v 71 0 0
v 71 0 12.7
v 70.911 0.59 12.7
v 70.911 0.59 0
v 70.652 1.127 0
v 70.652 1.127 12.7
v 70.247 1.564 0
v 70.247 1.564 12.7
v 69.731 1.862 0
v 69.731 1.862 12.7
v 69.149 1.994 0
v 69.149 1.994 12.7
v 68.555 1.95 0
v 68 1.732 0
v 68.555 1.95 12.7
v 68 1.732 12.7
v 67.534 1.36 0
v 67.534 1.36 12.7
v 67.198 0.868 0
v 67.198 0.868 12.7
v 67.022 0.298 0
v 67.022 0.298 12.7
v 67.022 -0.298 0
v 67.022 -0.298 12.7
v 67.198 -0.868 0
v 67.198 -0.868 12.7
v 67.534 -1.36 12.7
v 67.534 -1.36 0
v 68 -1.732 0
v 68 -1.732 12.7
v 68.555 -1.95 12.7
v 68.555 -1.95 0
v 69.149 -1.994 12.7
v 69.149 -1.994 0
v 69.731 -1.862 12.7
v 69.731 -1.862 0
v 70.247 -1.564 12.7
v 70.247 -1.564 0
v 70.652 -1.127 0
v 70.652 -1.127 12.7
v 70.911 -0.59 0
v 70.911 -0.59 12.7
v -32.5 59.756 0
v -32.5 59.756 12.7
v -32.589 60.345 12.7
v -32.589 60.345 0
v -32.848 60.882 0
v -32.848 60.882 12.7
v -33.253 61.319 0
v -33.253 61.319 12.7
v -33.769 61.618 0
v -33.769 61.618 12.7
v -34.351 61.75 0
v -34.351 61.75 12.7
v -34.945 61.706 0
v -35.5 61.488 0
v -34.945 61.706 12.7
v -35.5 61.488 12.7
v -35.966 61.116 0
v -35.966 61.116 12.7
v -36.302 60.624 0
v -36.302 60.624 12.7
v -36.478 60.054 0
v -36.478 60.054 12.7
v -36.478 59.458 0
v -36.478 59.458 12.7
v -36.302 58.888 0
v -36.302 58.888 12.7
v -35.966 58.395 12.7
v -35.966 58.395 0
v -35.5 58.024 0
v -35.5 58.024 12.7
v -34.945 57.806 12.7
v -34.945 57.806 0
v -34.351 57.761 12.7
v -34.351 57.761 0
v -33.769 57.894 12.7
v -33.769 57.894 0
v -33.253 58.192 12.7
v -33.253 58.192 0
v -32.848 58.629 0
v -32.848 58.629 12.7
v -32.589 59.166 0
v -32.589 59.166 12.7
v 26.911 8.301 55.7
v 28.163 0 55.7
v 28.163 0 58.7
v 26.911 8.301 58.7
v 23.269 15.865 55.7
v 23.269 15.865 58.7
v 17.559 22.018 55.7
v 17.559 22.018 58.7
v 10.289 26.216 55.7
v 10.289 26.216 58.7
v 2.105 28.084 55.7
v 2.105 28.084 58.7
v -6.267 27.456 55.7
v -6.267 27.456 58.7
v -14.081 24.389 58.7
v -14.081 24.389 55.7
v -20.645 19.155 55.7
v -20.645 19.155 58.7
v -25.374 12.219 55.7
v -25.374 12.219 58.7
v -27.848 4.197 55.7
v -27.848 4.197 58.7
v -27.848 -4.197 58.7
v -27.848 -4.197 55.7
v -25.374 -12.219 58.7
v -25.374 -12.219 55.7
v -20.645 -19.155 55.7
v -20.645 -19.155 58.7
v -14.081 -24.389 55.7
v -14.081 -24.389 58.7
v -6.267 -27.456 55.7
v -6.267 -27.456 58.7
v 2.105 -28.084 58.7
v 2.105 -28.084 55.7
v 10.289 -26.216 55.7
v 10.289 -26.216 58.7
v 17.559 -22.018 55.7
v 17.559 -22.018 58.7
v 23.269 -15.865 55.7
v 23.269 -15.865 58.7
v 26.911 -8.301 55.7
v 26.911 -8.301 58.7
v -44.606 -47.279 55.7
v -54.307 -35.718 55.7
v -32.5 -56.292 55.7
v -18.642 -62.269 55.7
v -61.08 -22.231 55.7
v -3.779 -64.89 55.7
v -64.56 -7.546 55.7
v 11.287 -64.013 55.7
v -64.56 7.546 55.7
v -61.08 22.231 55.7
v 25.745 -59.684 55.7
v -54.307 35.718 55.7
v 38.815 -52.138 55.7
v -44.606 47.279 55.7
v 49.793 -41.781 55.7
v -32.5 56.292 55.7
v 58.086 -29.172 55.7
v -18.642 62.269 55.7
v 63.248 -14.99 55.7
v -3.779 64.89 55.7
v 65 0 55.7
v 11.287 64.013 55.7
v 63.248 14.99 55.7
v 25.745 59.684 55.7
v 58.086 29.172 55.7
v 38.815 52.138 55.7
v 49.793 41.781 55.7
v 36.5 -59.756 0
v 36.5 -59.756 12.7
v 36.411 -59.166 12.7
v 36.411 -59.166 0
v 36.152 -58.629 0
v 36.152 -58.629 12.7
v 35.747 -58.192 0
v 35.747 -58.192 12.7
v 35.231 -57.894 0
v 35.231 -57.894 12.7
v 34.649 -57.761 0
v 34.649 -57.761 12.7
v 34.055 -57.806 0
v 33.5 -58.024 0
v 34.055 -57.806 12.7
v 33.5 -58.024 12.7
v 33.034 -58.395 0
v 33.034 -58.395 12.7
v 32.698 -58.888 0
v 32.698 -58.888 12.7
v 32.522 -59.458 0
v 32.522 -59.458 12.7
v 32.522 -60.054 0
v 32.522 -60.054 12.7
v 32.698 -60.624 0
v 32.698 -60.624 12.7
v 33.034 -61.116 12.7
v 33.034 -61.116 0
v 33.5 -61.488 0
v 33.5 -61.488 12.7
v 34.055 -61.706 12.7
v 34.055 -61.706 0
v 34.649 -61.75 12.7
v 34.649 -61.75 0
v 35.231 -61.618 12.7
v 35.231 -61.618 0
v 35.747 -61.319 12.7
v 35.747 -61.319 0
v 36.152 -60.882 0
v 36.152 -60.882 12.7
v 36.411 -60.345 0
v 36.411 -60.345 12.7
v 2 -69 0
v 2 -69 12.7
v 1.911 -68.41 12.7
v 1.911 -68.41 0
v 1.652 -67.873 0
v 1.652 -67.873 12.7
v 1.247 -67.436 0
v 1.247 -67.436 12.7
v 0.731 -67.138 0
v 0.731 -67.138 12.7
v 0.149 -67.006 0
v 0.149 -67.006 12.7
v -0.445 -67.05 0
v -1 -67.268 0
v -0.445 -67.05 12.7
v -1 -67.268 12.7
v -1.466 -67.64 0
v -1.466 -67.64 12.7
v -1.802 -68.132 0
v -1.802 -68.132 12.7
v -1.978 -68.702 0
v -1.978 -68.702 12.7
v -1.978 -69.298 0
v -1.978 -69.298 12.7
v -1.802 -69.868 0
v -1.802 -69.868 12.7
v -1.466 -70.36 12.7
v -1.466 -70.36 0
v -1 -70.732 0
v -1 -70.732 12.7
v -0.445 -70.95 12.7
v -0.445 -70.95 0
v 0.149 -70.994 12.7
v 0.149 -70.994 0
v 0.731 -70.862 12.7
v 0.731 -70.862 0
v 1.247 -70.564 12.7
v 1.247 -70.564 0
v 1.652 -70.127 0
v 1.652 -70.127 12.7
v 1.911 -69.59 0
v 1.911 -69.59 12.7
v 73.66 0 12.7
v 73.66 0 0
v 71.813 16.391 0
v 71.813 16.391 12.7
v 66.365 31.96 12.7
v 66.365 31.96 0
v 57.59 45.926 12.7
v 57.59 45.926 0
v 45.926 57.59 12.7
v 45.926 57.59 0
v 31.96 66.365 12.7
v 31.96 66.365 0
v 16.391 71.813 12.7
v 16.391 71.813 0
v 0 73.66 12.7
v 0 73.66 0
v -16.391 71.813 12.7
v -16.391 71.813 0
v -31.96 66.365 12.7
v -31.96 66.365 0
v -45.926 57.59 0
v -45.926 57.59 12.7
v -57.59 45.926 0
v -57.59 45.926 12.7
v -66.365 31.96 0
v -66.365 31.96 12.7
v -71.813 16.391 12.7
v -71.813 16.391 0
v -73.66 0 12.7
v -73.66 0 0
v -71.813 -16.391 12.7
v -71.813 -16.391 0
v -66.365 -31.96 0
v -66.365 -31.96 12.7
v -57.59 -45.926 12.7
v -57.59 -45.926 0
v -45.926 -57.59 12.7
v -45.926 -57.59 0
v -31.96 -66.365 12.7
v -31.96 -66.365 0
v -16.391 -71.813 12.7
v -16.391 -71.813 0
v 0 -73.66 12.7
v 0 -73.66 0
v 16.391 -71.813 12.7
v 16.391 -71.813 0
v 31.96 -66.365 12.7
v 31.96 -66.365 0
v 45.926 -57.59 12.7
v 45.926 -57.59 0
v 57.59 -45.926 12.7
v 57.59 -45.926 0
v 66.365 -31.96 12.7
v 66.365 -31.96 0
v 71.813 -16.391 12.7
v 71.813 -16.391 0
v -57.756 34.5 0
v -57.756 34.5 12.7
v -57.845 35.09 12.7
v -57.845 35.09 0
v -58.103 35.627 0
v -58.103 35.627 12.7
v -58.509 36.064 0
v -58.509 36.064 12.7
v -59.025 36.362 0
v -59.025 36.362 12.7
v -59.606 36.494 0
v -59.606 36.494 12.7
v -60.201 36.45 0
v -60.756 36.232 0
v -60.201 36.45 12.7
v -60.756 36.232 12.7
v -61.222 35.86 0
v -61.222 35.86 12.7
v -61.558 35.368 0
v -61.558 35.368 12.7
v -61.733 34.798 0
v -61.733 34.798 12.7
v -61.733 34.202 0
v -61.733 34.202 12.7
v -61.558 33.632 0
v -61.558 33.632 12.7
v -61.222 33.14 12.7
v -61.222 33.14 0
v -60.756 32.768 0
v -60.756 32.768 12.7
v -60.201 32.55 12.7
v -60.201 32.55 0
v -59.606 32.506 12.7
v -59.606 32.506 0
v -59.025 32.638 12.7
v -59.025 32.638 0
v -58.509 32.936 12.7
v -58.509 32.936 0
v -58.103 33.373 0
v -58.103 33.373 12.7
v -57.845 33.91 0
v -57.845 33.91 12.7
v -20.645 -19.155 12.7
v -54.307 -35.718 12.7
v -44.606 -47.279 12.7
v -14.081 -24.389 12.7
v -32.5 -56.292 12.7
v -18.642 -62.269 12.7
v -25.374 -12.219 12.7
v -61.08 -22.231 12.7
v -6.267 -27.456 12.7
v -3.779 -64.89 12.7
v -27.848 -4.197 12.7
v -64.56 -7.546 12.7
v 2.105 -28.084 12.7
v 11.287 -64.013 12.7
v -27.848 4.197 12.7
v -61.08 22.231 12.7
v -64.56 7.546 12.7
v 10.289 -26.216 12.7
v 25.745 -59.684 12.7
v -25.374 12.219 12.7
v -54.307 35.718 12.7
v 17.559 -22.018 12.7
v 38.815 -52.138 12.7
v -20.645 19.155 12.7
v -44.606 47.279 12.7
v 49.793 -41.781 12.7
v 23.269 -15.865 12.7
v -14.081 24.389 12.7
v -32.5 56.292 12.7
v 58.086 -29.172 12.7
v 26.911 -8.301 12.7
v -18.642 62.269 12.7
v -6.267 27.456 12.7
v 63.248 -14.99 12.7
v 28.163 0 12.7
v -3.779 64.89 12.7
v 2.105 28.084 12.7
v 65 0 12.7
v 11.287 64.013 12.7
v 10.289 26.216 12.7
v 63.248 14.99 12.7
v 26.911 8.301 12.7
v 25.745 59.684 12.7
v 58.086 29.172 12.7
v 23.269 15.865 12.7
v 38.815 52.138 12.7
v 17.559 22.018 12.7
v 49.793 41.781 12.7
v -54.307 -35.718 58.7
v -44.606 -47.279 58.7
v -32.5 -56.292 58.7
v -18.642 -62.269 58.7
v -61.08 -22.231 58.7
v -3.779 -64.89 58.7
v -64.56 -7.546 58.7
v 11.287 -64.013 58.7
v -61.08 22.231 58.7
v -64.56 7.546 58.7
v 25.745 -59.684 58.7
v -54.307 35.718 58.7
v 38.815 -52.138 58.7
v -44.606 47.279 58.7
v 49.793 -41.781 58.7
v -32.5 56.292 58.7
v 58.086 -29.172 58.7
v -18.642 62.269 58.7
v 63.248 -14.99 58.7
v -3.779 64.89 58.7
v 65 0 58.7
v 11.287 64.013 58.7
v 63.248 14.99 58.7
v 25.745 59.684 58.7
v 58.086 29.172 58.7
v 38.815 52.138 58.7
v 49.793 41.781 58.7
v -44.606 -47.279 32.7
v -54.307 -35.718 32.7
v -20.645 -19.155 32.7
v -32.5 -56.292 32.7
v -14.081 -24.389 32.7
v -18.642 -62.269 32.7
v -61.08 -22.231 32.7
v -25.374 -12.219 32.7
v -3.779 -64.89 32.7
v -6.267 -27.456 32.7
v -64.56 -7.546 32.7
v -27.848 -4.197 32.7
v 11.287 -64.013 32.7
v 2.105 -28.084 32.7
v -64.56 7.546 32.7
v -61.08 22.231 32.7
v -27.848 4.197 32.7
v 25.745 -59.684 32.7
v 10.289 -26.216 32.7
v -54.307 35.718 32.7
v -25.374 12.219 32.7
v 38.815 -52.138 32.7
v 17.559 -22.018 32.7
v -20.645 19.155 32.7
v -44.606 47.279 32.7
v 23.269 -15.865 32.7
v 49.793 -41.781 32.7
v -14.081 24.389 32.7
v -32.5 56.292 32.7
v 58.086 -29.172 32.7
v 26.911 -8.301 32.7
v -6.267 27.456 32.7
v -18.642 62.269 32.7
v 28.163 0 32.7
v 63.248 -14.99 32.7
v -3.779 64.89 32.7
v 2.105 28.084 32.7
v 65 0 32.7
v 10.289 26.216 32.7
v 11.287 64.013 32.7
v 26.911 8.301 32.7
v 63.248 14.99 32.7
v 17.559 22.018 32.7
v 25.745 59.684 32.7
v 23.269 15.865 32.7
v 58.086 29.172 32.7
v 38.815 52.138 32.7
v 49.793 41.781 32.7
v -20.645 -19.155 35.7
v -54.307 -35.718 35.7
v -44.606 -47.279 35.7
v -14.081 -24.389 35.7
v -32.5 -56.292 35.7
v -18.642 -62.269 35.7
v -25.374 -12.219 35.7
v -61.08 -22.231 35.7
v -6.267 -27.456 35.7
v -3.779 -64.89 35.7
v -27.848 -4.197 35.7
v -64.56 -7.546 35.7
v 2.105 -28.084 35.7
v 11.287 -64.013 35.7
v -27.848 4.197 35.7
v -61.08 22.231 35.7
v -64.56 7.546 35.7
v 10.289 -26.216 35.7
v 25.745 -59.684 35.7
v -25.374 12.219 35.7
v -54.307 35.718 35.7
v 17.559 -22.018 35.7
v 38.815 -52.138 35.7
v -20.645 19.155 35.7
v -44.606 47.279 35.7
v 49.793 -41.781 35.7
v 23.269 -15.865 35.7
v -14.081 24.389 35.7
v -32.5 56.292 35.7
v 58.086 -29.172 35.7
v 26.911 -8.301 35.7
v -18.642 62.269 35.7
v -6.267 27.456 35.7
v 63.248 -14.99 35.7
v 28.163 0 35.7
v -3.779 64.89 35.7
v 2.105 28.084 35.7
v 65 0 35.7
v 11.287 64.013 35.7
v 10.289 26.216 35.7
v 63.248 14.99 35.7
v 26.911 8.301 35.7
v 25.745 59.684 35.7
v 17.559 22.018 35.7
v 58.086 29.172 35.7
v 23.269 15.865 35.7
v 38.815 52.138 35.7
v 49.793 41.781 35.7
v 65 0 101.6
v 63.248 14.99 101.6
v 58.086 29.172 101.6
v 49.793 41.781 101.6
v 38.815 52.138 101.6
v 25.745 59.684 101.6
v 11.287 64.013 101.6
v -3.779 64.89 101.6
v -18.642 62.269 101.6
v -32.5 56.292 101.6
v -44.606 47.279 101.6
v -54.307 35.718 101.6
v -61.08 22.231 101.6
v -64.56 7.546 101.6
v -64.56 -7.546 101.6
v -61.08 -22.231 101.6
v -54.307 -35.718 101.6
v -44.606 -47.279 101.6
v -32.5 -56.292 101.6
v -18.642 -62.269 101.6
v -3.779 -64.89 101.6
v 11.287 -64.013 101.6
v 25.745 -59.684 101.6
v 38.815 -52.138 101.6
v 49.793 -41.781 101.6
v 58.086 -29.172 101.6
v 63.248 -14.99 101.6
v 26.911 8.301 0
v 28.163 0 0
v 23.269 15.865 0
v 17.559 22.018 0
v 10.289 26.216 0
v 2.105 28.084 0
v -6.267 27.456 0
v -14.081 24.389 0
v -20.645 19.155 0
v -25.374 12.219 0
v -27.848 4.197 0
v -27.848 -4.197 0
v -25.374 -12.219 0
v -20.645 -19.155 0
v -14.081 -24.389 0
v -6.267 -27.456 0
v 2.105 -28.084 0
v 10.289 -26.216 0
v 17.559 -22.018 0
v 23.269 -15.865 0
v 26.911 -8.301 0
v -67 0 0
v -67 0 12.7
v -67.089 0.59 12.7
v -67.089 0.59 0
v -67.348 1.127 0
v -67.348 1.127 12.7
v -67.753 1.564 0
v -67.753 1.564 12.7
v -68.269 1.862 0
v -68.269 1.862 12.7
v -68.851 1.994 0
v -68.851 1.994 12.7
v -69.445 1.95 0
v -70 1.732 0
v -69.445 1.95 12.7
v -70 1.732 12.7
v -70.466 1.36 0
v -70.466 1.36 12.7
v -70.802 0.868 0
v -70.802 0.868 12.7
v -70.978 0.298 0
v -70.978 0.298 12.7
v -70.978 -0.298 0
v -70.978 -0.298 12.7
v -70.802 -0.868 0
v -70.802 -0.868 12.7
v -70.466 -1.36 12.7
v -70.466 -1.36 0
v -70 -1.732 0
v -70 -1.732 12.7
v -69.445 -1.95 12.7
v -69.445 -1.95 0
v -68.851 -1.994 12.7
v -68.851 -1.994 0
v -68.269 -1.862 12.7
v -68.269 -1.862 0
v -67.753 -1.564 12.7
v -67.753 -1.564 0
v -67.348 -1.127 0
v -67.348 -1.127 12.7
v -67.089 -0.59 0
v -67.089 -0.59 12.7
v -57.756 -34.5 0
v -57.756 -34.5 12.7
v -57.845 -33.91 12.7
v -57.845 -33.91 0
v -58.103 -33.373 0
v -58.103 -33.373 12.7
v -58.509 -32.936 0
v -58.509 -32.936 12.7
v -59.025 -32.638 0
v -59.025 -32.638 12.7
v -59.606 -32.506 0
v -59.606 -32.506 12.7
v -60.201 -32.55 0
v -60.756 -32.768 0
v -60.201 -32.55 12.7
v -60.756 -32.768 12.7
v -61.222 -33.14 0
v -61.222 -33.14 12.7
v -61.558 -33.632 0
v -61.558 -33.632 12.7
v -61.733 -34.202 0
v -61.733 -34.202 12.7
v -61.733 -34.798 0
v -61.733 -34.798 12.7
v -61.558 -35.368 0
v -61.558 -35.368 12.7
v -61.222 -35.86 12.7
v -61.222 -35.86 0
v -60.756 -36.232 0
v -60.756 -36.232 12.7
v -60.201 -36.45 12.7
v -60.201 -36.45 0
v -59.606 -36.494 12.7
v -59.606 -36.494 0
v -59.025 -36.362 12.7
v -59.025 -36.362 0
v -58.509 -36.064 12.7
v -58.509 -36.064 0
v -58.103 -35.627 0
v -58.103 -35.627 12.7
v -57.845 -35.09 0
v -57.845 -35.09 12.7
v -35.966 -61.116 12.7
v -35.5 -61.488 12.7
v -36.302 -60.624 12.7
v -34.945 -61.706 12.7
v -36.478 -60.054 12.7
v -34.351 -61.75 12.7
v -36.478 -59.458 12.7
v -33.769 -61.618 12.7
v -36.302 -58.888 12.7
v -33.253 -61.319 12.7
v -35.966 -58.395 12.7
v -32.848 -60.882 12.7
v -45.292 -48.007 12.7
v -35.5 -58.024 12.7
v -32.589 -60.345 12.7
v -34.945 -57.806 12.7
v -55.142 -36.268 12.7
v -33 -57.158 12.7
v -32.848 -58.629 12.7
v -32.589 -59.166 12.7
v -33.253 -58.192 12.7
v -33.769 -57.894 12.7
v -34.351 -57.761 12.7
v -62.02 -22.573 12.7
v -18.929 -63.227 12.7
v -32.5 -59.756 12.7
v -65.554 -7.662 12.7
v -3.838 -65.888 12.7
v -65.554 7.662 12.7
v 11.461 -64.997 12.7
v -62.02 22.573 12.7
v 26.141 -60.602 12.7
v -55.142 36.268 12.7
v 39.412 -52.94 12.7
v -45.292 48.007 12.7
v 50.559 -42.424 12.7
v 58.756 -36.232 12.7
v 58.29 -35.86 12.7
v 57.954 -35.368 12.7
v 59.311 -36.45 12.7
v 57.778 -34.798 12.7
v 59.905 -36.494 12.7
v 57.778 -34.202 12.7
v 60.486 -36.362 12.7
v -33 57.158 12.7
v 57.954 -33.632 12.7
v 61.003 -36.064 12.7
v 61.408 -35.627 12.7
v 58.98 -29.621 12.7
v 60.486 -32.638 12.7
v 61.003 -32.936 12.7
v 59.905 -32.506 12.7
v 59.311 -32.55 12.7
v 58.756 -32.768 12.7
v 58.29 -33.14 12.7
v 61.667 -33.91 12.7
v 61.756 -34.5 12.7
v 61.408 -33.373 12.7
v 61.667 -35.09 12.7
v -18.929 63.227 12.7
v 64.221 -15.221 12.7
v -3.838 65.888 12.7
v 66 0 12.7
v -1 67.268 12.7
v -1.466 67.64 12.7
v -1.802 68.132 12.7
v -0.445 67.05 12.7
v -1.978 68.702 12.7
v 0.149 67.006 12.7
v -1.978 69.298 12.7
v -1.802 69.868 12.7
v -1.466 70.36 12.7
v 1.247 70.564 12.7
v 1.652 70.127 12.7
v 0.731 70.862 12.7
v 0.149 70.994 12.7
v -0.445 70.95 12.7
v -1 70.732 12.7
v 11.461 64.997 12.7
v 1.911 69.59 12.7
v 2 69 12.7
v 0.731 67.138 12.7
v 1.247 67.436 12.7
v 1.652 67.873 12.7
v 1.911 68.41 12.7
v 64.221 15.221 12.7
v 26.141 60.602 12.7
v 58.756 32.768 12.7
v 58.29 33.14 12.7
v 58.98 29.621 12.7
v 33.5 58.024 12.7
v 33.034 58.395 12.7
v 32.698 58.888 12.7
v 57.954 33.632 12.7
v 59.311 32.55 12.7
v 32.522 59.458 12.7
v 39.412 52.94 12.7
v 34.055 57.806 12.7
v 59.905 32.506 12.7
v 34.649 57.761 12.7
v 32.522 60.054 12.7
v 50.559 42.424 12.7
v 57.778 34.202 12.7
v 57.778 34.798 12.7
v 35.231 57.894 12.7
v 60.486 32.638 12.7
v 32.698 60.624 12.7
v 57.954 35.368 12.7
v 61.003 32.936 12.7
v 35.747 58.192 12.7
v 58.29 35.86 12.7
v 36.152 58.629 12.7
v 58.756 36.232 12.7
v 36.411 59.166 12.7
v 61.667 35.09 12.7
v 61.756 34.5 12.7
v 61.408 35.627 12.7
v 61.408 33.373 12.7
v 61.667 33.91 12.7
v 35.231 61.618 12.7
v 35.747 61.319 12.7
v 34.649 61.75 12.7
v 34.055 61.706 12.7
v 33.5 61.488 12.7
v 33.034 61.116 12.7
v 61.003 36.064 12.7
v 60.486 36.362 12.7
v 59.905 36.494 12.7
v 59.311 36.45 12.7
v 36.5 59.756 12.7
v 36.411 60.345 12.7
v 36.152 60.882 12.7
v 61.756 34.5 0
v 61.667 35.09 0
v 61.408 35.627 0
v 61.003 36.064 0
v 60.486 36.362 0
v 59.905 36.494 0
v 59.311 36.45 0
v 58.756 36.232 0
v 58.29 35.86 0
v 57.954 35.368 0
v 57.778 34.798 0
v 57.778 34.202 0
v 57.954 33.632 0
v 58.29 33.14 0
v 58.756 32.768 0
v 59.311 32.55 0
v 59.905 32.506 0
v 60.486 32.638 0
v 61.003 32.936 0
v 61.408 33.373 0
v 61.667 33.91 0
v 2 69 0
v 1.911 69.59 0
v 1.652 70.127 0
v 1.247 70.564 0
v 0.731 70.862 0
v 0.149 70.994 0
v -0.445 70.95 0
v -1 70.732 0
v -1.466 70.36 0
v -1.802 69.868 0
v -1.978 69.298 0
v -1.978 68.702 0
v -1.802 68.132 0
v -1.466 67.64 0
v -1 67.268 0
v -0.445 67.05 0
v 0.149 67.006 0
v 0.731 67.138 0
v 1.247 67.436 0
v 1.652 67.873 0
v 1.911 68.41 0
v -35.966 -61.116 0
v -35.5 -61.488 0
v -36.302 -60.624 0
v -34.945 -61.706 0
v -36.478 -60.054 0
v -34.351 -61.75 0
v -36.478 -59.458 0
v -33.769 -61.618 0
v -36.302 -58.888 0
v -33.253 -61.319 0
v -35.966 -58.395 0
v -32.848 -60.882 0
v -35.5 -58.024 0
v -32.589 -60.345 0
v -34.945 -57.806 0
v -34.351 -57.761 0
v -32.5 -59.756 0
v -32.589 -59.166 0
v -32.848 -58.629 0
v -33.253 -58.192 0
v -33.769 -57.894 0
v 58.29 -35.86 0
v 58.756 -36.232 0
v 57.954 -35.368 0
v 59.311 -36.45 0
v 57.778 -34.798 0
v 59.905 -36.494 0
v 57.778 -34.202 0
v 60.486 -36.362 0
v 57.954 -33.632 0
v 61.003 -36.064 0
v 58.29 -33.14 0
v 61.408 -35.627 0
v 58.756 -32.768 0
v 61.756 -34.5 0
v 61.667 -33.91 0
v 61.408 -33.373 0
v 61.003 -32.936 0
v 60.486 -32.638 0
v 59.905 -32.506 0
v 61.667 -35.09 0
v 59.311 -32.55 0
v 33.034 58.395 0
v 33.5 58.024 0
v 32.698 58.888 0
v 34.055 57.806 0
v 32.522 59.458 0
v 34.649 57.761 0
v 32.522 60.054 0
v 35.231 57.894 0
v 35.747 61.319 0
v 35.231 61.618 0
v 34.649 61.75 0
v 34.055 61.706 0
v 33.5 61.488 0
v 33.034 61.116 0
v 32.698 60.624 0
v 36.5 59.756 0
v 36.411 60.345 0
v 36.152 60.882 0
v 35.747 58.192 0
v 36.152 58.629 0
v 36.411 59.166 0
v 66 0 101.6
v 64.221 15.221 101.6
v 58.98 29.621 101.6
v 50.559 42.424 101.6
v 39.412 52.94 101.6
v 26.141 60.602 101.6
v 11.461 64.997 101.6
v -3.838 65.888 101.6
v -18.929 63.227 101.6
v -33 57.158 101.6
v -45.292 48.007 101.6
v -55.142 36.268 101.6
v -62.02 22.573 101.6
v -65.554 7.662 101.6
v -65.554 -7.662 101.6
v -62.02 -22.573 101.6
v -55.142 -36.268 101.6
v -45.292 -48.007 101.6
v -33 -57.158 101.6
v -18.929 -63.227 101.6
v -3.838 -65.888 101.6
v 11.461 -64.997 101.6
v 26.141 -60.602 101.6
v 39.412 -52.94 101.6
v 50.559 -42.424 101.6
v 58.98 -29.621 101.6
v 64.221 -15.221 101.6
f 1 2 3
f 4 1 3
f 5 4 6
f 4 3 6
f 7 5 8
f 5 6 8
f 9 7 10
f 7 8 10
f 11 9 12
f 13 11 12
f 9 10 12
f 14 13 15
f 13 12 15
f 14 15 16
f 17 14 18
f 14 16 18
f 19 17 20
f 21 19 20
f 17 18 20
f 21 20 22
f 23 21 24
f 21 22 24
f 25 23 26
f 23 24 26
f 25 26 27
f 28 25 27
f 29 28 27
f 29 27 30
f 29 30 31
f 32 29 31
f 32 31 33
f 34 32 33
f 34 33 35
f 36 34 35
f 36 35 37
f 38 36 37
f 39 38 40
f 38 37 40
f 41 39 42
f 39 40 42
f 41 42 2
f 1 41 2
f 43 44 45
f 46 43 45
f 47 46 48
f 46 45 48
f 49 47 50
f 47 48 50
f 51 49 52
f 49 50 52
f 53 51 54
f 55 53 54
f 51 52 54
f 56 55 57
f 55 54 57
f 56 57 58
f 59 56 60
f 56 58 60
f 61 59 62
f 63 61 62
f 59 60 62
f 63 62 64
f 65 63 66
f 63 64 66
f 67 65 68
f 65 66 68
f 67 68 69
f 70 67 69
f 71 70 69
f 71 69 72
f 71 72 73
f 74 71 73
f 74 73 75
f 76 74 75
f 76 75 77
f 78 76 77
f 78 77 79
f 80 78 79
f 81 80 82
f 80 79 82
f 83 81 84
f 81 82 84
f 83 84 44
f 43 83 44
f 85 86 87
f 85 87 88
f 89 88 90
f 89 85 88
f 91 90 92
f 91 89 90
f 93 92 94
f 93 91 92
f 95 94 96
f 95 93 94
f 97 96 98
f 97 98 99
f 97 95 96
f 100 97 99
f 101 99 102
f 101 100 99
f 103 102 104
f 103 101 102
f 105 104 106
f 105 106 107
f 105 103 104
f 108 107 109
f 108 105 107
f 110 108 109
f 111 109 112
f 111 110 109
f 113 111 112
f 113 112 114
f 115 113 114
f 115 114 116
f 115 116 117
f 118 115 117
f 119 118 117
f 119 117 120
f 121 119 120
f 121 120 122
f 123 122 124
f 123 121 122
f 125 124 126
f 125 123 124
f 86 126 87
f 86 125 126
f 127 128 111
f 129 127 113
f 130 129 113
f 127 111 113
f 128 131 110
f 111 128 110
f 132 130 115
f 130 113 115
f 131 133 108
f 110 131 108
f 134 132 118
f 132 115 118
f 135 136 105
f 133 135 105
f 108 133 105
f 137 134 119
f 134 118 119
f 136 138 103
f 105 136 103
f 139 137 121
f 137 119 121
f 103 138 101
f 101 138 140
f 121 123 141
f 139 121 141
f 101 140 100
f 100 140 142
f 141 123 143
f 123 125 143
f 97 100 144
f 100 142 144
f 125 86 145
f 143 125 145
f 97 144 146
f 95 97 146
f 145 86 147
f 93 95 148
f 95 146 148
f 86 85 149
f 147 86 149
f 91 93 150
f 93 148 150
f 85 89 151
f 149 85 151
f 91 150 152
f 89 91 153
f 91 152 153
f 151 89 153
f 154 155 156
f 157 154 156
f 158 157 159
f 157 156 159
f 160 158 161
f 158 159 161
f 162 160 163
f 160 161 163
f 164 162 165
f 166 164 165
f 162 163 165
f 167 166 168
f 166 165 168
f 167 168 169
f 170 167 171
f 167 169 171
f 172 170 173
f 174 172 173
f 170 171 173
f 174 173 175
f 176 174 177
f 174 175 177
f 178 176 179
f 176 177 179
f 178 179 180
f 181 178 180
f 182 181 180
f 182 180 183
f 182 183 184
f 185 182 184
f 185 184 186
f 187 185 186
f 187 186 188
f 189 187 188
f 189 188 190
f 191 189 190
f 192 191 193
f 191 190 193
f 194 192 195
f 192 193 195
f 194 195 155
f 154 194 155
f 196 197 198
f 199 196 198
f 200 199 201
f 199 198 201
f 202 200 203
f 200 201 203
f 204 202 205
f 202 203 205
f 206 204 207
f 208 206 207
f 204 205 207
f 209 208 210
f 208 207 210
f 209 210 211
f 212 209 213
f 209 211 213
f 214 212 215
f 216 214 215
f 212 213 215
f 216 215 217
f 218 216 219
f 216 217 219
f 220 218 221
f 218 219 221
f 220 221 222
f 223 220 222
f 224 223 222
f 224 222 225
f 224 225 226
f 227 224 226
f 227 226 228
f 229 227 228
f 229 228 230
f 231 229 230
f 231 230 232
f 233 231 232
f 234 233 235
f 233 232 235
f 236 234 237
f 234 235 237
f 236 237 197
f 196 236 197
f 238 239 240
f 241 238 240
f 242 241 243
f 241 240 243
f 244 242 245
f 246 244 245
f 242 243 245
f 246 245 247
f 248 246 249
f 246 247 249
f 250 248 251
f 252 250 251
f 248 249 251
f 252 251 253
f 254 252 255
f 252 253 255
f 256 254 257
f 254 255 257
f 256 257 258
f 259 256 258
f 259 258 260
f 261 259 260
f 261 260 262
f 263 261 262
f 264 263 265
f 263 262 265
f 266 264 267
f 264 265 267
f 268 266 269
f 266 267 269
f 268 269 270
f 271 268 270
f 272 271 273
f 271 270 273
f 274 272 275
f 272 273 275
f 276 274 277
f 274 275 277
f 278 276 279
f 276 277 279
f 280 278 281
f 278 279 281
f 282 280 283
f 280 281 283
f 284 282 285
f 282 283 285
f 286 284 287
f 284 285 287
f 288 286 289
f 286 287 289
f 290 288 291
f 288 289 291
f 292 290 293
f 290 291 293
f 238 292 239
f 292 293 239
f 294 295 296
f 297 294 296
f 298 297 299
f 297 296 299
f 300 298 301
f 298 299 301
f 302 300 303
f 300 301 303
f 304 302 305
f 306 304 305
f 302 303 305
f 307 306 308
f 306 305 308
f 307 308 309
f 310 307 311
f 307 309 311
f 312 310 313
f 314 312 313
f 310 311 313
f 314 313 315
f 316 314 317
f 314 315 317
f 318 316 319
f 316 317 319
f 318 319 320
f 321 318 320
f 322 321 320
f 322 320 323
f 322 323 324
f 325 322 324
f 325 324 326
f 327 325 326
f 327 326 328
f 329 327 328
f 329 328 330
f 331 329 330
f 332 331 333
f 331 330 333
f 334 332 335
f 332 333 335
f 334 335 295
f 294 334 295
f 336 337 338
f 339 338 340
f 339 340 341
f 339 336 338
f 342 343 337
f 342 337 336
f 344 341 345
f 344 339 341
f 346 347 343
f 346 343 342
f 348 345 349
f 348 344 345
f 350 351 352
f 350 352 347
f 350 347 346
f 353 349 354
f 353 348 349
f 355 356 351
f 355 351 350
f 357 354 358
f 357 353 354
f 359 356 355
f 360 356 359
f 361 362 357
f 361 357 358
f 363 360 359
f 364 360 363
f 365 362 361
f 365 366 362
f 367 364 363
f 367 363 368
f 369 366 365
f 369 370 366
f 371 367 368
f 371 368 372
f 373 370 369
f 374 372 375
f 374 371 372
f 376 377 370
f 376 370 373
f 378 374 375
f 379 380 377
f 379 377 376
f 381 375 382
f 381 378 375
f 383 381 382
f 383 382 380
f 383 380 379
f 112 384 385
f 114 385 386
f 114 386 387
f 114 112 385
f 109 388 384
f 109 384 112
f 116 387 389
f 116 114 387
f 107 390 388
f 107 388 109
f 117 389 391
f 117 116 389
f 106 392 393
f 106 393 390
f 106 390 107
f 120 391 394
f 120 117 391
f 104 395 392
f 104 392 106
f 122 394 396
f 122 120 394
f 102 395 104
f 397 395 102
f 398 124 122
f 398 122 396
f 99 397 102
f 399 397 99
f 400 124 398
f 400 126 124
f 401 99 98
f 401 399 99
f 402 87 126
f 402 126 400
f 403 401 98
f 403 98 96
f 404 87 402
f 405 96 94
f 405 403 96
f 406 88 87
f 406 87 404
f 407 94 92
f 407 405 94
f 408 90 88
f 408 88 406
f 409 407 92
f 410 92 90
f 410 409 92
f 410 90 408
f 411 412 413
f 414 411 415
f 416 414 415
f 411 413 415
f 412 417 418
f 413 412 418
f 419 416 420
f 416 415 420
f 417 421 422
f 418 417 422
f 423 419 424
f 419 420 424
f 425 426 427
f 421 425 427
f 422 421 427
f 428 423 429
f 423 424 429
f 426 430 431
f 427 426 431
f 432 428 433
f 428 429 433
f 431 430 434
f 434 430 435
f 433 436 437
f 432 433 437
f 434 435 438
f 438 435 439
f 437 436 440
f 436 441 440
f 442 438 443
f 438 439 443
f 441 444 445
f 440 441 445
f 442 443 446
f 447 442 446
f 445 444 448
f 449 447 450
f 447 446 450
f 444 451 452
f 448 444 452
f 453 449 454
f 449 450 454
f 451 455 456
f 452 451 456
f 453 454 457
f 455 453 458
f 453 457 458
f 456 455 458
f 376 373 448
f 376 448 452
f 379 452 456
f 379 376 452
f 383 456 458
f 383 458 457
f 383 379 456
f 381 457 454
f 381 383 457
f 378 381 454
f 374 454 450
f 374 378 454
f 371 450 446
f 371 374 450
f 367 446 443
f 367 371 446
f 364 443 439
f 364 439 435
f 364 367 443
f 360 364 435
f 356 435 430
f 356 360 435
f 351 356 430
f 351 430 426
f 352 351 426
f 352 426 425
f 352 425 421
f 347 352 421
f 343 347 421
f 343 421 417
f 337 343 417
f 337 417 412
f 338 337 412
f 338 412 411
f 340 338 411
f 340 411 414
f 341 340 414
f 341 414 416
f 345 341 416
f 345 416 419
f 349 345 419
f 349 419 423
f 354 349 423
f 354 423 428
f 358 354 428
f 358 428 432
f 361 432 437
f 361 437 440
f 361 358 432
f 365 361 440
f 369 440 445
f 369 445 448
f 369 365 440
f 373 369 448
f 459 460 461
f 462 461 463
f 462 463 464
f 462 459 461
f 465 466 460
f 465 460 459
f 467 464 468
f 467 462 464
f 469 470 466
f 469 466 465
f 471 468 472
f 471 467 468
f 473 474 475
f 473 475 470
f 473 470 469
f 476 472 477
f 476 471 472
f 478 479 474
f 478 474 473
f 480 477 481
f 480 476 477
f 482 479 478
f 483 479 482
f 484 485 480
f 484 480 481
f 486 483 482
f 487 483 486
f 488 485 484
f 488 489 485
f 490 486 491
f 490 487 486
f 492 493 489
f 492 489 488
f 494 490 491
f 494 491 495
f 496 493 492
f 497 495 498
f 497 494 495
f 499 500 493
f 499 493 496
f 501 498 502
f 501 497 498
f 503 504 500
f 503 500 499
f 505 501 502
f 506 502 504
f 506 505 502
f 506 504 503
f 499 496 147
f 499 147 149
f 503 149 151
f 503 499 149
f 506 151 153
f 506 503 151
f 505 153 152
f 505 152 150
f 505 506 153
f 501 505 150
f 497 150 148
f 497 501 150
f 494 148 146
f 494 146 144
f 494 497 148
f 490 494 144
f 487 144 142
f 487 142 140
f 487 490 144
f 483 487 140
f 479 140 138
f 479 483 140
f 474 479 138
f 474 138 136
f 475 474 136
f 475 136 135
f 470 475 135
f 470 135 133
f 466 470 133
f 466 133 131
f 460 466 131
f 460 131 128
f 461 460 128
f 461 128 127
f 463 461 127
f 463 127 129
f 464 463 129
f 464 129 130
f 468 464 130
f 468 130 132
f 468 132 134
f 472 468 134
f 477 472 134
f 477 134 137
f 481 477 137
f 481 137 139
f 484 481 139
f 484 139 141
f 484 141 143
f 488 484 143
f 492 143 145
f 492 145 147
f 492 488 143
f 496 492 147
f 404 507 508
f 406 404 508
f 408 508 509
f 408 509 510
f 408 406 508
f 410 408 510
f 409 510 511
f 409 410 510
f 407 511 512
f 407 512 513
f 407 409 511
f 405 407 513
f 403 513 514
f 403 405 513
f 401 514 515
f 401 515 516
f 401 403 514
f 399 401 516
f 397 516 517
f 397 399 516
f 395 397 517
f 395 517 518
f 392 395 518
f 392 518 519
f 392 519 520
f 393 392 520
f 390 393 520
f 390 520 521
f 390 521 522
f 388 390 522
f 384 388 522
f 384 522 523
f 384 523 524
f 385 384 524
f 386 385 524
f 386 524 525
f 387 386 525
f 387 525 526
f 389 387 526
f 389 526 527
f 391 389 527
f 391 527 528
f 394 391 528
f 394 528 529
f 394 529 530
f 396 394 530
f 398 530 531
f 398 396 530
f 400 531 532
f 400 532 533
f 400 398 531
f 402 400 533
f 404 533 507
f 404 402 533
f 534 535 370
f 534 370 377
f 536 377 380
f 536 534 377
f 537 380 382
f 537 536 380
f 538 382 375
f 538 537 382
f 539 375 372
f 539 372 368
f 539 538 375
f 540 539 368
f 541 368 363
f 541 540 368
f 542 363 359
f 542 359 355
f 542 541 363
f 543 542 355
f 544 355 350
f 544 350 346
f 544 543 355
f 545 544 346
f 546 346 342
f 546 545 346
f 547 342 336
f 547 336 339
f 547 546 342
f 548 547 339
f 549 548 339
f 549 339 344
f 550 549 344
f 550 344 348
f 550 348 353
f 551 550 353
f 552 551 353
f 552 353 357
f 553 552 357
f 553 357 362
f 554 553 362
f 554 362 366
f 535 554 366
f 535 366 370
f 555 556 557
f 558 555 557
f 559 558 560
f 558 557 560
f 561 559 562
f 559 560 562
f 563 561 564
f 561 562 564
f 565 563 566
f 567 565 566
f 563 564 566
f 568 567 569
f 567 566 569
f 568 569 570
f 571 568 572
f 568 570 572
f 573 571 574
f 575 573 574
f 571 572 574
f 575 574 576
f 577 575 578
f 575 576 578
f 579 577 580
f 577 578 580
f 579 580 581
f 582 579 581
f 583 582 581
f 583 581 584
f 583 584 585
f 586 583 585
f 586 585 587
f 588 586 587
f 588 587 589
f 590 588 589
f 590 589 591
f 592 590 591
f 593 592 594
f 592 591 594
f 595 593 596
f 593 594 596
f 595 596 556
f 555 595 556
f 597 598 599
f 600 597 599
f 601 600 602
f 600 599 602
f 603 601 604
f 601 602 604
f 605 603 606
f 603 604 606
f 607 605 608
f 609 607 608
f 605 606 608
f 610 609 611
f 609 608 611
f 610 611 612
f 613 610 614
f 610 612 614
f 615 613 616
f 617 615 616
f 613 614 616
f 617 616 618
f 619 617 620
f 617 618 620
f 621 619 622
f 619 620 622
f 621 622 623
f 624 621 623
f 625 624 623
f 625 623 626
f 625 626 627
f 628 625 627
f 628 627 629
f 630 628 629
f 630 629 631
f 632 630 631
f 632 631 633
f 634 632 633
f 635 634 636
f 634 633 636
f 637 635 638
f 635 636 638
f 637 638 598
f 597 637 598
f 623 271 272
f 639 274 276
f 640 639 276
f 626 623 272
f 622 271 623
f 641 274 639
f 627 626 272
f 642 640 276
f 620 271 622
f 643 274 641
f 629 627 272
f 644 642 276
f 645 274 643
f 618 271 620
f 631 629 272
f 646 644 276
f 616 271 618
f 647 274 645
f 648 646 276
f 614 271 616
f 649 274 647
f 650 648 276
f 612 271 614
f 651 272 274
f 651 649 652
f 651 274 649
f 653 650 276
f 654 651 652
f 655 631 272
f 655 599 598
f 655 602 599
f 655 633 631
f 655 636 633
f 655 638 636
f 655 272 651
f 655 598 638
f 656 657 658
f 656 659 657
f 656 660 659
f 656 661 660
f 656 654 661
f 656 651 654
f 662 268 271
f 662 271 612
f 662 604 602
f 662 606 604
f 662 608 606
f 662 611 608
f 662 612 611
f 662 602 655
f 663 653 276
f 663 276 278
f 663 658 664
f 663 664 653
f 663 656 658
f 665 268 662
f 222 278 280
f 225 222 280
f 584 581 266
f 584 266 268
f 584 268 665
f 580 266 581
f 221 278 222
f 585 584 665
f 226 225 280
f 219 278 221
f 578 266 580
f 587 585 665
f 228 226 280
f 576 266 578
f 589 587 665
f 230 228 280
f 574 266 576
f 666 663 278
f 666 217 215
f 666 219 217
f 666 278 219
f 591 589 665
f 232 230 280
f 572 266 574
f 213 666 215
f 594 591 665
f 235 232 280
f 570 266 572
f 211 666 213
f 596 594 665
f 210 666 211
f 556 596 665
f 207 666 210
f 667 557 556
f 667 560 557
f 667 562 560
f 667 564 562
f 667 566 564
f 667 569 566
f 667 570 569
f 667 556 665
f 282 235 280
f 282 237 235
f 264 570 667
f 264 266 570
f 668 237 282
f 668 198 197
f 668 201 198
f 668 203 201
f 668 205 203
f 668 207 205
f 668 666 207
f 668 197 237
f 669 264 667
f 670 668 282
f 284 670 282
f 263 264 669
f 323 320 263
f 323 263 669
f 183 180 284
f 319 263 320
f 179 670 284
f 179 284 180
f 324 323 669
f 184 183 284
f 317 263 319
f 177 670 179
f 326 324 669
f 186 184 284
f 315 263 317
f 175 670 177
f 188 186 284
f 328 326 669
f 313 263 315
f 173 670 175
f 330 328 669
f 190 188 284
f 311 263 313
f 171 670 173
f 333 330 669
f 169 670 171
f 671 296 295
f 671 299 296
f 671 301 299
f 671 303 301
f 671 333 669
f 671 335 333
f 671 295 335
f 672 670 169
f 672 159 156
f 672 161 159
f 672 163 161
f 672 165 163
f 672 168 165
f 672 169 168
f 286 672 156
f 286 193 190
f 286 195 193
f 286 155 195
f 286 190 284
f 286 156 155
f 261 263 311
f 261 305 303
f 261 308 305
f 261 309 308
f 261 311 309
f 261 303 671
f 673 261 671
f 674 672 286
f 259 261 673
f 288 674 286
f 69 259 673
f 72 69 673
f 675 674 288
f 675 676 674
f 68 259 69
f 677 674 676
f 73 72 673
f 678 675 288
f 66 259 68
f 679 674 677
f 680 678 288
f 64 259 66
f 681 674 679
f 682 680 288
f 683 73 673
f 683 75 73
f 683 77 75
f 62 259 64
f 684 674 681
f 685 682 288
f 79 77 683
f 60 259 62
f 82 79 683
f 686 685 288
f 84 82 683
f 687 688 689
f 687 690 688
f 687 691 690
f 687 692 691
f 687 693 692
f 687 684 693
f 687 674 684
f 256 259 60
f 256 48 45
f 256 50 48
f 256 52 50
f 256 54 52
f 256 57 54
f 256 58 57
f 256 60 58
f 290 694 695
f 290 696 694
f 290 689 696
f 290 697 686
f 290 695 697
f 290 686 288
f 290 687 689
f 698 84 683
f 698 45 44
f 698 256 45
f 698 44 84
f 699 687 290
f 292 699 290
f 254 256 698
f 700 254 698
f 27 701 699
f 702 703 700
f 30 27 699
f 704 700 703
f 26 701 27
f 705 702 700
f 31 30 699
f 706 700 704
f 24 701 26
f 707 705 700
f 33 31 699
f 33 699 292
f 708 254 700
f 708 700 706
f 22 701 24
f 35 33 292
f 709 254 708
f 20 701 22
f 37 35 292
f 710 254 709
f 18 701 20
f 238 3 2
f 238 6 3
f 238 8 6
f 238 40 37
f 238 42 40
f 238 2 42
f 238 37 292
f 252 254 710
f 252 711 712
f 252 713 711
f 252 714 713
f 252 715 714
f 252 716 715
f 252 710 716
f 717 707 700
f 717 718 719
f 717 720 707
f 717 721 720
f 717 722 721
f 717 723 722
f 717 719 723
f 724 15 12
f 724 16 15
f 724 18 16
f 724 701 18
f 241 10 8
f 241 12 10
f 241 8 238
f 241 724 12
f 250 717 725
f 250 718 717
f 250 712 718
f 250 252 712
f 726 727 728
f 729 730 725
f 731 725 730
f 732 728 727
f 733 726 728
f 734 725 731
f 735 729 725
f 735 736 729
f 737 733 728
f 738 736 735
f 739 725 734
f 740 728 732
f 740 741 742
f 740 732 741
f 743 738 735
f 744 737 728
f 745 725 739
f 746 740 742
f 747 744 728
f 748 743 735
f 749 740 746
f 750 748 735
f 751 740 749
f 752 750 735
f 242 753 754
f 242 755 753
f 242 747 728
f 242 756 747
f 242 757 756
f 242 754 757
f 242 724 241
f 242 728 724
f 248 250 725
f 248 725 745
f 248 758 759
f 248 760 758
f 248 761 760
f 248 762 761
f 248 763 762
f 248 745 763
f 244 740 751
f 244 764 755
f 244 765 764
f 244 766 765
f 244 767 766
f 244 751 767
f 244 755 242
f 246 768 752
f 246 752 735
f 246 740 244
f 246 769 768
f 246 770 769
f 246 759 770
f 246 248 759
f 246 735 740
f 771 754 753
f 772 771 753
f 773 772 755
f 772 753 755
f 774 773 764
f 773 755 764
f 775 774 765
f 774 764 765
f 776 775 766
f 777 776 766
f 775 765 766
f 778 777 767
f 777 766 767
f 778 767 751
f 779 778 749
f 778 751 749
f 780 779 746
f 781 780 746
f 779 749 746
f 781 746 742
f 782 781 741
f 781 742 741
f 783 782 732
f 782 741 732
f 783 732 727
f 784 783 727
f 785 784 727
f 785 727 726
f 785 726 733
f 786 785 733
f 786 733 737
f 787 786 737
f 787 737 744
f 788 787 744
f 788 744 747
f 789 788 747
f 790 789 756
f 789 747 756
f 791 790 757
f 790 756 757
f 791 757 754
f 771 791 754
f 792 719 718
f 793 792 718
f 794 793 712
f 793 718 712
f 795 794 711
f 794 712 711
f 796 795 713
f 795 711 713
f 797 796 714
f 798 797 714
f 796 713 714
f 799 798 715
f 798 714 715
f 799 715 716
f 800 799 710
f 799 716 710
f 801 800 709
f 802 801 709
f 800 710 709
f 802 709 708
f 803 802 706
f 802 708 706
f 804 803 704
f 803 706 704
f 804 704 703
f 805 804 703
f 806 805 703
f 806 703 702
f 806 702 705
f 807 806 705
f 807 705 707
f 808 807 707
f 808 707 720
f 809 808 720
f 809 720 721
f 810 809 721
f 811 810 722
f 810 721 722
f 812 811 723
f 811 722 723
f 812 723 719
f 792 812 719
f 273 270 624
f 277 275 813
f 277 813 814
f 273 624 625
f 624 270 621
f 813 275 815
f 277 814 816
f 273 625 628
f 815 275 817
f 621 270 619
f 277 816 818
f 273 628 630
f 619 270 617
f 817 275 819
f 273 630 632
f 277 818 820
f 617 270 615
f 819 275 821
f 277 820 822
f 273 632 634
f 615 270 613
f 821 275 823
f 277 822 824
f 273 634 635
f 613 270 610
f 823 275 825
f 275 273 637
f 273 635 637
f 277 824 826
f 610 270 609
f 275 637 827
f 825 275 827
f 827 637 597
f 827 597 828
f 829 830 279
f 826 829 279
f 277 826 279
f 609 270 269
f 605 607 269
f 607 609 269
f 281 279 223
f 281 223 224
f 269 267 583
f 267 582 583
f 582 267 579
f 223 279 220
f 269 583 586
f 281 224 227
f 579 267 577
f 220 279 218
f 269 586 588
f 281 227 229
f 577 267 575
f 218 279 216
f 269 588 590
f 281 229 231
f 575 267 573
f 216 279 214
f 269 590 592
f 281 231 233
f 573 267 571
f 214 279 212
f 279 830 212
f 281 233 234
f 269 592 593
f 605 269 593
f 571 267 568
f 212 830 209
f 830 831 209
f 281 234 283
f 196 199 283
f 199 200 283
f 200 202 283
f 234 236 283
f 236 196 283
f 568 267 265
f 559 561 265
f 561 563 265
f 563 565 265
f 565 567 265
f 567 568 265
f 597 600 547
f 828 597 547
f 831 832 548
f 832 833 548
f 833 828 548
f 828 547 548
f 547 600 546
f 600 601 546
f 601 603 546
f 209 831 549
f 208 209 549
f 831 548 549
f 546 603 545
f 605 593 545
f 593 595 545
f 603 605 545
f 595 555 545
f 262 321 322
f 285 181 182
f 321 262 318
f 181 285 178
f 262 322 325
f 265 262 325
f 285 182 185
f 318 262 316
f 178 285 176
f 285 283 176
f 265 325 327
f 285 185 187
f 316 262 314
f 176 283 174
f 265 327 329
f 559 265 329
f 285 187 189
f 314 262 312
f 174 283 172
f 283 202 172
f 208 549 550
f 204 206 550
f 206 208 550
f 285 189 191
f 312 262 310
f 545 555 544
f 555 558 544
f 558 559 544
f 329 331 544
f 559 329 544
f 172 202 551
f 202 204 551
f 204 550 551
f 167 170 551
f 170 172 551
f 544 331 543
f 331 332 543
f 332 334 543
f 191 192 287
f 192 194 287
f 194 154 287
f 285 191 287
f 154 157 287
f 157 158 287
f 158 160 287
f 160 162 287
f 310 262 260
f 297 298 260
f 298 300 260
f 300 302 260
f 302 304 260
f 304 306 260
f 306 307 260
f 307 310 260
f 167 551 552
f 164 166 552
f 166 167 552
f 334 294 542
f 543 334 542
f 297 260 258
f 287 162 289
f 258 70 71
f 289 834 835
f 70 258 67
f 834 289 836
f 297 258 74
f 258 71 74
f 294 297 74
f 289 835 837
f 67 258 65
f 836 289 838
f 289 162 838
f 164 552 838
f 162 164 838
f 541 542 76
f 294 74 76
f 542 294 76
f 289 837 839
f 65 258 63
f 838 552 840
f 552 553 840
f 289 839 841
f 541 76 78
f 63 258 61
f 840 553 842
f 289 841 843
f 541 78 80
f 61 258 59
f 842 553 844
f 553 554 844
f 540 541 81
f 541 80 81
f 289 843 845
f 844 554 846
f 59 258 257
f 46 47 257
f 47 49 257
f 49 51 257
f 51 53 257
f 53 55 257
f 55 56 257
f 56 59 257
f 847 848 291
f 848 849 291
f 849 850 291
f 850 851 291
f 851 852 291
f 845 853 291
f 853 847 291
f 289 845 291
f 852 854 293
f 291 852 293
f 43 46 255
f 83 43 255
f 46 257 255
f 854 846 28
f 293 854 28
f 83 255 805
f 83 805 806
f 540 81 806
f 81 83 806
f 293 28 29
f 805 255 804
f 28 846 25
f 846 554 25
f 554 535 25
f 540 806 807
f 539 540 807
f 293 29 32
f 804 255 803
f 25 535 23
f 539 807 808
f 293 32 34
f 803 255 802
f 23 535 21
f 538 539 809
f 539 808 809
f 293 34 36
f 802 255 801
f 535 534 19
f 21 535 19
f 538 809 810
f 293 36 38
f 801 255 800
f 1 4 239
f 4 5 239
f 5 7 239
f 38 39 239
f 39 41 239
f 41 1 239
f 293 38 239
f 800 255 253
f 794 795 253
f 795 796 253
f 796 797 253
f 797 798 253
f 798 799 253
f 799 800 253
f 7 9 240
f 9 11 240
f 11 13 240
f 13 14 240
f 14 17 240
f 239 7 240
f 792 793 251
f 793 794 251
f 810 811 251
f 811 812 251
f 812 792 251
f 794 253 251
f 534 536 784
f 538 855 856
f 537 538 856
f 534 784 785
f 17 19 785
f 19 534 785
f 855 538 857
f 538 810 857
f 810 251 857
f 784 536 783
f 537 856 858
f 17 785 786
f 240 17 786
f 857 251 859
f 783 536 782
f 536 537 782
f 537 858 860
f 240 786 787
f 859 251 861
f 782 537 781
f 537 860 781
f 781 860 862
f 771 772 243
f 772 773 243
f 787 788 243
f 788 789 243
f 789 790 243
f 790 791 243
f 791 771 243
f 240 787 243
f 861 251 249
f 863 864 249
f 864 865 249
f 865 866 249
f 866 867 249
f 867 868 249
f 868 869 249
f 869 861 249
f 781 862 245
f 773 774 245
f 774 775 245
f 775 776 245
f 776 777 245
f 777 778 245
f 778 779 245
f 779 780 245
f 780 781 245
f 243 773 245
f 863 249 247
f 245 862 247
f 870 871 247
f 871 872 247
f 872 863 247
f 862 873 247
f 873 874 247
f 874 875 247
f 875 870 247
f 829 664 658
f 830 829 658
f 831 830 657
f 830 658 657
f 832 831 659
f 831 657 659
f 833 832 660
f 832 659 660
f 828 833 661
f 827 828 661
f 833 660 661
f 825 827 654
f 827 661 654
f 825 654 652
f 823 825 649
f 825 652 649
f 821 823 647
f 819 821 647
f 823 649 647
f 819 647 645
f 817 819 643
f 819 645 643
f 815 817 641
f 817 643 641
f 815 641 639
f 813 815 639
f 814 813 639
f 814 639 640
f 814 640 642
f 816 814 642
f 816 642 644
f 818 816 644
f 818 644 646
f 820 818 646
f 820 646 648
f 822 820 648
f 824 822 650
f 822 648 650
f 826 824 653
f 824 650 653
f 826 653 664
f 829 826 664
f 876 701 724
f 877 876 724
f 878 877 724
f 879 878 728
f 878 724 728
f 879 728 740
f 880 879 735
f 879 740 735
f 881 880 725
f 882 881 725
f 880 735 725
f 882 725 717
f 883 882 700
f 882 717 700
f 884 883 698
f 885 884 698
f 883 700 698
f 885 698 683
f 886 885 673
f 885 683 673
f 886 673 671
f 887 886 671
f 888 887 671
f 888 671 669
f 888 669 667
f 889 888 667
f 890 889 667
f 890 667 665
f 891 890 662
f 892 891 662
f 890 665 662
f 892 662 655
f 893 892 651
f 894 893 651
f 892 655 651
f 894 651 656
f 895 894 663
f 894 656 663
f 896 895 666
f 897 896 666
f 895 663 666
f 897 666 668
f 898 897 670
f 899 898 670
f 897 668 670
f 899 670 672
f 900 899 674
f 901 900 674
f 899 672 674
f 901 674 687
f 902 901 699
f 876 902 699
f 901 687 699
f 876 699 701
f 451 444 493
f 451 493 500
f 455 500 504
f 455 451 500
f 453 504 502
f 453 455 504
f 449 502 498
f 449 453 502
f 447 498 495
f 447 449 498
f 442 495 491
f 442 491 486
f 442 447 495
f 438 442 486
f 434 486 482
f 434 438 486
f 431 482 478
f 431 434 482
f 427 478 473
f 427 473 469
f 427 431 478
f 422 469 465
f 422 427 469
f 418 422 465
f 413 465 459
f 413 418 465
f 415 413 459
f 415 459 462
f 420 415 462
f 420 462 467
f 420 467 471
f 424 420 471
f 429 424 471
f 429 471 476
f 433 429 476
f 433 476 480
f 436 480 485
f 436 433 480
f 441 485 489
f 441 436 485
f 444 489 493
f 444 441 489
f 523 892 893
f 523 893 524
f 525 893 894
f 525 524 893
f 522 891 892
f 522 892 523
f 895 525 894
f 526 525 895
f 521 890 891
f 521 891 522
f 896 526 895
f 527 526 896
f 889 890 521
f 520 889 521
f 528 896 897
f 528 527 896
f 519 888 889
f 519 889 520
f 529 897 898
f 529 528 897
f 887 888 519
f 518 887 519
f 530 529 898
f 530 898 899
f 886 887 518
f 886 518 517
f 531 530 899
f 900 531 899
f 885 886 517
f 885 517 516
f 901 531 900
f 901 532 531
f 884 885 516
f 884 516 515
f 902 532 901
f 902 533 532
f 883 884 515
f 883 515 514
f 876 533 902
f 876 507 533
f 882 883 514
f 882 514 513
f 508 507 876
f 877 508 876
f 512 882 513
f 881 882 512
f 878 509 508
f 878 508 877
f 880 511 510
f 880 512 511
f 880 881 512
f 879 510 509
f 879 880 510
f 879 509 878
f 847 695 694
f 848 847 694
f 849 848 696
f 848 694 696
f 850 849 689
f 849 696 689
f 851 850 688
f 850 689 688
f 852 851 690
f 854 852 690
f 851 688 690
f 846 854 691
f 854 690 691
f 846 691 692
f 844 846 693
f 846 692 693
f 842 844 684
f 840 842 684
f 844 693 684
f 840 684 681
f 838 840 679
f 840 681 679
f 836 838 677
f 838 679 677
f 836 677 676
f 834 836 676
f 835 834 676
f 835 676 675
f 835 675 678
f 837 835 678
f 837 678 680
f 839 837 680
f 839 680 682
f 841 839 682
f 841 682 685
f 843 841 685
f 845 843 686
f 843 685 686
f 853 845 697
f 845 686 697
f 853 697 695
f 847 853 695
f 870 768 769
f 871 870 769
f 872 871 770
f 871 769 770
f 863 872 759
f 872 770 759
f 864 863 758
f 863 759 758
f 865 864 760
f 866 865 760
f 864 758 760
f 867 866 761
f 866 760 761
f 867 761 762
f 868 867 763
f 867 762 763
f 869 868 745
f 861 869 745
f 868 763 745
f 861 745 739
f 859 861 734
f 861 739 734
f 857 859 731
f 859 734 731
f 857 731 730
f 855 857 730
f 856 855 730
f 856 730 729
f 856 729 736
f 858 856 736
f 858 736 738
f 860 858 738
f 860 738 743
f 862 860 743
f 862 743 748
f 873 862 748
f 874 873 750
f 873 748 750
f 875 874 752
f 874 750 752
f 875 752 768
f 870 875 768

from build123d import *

# Parameters (mm, degrees)
SKETCH1_R           = 73.66
BOSS_EXTRUDE1_DEPTH = 12.7
SKETCH2_R           = 2
CUT_EXTRUDE1_DEPTH  = 12.7
SKETCH3_R           = 66
SKETCH3_R_2         = 65
BOSS_EXTRUDE2_DEPTH = 88.9
SKETCH4_R           = 65
SKETCH4_R_2         = 28.162552898
BOSS_EXTRUDE3_DEPTH = 3
SKETCH5_R           = 65
SKETCH5_R_2         = 28.162552898
BOSS_EXTRUDE4_DEPTH = 3
CUT_EXTRUDE2_START  = -300
SKETCH6_R           = 28.162552898
CUT_EXTRUDE2_DEPTH  = 300


with BuildPart() as part:
    # Sketch1 → Boss-Extrude1 (new body)
    with BuildSketch(Plane.XY):
        Circle(SKETCH1_R)
    extrude(amount=BOSS_EXTRUDE1_DEPTH)

    # Sketch2 → Cut-Extrude1 (cut)
    with BuildSketch(Plane.XY.offset(12.7)):
        with Locations((0, 69)):
            Circle(SKETCH2_R)
        with Locations((34.5, 59.755752861)):
            Circle(SKETCH2_R)
        with Locations((59.755752861, 34.5)):
            Circle(SKETCH2_R)
        with Locations((69, 0)):
            Circle(SKETCH2_R)
        with Locations((59.755752861, -34.5)):
            Circle(SKETCH2_R)
        with Locations((34.5, -59.755752861)):
            Circle(SKETCH2_R)
        with Locations((0, -69)):
            Circle(SKETCH2_R)
        with Locations((-34.5, -59.755752861)):
            Circle(SKETCH2_R)
        with Locations((-59.755752861, -34.5)):
            Circle(SKETCH2_R)
        with Locations((-69, 0)):
            Circle(SKETCH2_R)
        with Locations((-59.755752861, 34.5)):
            Circle(SKETCH2_R)
        with Locations((-34.5, 59.755752861)):
            Circle(SKETCH2_R)
    extrude(amount=-CUT_EXTRUDE1_DEPTH, mode=Mode.SUBTRACT)

    # Sketch3 → Boss-Extrude2 (add)
    with BuildSketch(Plane.XY.offset(12.7)):
        Circle(SKETCH3_R)
        Circle(SKETCH3_R_2, mode=Mode.SUBTRACT)
    extrude(amount=BOSS_EXTRUDE2_DEPTH)

    # Sketch4 → Boss-Extrude3 (add)
    with BuildSketch(Plane.XY.offset(32.7)):
        Circle(SKETCH4_R)
        Circle(SKETCH4_R_2, mode=Mode.SUBTRACT)
    extrude(amount=BOSS_EXTRUDE3_DEPTH)

    # Sketch5 → Boss-Extrude4 (add)
    with BuildSketch(Plane.XY.offset(55.7)):
        Circle(SKETCH5_R)
        Circle(SKETCH5_R_2, mode=Mode.SUBTRACT)
    extrude(amount=BOSS_EXTRUDE4_DEPTH)

    # Sketch6 → Cut-Extrude2 (cut)
    with BuildSketch(Plane.XY.offset(12.7).offset(CUT_EXTRUDE2_START)):
        Circle(SKETCH6_R)
    extrude(amount=CUT_EXTRUDE2_DEPTH, mode=Mode.SUBTRACT)


solid = part.part
